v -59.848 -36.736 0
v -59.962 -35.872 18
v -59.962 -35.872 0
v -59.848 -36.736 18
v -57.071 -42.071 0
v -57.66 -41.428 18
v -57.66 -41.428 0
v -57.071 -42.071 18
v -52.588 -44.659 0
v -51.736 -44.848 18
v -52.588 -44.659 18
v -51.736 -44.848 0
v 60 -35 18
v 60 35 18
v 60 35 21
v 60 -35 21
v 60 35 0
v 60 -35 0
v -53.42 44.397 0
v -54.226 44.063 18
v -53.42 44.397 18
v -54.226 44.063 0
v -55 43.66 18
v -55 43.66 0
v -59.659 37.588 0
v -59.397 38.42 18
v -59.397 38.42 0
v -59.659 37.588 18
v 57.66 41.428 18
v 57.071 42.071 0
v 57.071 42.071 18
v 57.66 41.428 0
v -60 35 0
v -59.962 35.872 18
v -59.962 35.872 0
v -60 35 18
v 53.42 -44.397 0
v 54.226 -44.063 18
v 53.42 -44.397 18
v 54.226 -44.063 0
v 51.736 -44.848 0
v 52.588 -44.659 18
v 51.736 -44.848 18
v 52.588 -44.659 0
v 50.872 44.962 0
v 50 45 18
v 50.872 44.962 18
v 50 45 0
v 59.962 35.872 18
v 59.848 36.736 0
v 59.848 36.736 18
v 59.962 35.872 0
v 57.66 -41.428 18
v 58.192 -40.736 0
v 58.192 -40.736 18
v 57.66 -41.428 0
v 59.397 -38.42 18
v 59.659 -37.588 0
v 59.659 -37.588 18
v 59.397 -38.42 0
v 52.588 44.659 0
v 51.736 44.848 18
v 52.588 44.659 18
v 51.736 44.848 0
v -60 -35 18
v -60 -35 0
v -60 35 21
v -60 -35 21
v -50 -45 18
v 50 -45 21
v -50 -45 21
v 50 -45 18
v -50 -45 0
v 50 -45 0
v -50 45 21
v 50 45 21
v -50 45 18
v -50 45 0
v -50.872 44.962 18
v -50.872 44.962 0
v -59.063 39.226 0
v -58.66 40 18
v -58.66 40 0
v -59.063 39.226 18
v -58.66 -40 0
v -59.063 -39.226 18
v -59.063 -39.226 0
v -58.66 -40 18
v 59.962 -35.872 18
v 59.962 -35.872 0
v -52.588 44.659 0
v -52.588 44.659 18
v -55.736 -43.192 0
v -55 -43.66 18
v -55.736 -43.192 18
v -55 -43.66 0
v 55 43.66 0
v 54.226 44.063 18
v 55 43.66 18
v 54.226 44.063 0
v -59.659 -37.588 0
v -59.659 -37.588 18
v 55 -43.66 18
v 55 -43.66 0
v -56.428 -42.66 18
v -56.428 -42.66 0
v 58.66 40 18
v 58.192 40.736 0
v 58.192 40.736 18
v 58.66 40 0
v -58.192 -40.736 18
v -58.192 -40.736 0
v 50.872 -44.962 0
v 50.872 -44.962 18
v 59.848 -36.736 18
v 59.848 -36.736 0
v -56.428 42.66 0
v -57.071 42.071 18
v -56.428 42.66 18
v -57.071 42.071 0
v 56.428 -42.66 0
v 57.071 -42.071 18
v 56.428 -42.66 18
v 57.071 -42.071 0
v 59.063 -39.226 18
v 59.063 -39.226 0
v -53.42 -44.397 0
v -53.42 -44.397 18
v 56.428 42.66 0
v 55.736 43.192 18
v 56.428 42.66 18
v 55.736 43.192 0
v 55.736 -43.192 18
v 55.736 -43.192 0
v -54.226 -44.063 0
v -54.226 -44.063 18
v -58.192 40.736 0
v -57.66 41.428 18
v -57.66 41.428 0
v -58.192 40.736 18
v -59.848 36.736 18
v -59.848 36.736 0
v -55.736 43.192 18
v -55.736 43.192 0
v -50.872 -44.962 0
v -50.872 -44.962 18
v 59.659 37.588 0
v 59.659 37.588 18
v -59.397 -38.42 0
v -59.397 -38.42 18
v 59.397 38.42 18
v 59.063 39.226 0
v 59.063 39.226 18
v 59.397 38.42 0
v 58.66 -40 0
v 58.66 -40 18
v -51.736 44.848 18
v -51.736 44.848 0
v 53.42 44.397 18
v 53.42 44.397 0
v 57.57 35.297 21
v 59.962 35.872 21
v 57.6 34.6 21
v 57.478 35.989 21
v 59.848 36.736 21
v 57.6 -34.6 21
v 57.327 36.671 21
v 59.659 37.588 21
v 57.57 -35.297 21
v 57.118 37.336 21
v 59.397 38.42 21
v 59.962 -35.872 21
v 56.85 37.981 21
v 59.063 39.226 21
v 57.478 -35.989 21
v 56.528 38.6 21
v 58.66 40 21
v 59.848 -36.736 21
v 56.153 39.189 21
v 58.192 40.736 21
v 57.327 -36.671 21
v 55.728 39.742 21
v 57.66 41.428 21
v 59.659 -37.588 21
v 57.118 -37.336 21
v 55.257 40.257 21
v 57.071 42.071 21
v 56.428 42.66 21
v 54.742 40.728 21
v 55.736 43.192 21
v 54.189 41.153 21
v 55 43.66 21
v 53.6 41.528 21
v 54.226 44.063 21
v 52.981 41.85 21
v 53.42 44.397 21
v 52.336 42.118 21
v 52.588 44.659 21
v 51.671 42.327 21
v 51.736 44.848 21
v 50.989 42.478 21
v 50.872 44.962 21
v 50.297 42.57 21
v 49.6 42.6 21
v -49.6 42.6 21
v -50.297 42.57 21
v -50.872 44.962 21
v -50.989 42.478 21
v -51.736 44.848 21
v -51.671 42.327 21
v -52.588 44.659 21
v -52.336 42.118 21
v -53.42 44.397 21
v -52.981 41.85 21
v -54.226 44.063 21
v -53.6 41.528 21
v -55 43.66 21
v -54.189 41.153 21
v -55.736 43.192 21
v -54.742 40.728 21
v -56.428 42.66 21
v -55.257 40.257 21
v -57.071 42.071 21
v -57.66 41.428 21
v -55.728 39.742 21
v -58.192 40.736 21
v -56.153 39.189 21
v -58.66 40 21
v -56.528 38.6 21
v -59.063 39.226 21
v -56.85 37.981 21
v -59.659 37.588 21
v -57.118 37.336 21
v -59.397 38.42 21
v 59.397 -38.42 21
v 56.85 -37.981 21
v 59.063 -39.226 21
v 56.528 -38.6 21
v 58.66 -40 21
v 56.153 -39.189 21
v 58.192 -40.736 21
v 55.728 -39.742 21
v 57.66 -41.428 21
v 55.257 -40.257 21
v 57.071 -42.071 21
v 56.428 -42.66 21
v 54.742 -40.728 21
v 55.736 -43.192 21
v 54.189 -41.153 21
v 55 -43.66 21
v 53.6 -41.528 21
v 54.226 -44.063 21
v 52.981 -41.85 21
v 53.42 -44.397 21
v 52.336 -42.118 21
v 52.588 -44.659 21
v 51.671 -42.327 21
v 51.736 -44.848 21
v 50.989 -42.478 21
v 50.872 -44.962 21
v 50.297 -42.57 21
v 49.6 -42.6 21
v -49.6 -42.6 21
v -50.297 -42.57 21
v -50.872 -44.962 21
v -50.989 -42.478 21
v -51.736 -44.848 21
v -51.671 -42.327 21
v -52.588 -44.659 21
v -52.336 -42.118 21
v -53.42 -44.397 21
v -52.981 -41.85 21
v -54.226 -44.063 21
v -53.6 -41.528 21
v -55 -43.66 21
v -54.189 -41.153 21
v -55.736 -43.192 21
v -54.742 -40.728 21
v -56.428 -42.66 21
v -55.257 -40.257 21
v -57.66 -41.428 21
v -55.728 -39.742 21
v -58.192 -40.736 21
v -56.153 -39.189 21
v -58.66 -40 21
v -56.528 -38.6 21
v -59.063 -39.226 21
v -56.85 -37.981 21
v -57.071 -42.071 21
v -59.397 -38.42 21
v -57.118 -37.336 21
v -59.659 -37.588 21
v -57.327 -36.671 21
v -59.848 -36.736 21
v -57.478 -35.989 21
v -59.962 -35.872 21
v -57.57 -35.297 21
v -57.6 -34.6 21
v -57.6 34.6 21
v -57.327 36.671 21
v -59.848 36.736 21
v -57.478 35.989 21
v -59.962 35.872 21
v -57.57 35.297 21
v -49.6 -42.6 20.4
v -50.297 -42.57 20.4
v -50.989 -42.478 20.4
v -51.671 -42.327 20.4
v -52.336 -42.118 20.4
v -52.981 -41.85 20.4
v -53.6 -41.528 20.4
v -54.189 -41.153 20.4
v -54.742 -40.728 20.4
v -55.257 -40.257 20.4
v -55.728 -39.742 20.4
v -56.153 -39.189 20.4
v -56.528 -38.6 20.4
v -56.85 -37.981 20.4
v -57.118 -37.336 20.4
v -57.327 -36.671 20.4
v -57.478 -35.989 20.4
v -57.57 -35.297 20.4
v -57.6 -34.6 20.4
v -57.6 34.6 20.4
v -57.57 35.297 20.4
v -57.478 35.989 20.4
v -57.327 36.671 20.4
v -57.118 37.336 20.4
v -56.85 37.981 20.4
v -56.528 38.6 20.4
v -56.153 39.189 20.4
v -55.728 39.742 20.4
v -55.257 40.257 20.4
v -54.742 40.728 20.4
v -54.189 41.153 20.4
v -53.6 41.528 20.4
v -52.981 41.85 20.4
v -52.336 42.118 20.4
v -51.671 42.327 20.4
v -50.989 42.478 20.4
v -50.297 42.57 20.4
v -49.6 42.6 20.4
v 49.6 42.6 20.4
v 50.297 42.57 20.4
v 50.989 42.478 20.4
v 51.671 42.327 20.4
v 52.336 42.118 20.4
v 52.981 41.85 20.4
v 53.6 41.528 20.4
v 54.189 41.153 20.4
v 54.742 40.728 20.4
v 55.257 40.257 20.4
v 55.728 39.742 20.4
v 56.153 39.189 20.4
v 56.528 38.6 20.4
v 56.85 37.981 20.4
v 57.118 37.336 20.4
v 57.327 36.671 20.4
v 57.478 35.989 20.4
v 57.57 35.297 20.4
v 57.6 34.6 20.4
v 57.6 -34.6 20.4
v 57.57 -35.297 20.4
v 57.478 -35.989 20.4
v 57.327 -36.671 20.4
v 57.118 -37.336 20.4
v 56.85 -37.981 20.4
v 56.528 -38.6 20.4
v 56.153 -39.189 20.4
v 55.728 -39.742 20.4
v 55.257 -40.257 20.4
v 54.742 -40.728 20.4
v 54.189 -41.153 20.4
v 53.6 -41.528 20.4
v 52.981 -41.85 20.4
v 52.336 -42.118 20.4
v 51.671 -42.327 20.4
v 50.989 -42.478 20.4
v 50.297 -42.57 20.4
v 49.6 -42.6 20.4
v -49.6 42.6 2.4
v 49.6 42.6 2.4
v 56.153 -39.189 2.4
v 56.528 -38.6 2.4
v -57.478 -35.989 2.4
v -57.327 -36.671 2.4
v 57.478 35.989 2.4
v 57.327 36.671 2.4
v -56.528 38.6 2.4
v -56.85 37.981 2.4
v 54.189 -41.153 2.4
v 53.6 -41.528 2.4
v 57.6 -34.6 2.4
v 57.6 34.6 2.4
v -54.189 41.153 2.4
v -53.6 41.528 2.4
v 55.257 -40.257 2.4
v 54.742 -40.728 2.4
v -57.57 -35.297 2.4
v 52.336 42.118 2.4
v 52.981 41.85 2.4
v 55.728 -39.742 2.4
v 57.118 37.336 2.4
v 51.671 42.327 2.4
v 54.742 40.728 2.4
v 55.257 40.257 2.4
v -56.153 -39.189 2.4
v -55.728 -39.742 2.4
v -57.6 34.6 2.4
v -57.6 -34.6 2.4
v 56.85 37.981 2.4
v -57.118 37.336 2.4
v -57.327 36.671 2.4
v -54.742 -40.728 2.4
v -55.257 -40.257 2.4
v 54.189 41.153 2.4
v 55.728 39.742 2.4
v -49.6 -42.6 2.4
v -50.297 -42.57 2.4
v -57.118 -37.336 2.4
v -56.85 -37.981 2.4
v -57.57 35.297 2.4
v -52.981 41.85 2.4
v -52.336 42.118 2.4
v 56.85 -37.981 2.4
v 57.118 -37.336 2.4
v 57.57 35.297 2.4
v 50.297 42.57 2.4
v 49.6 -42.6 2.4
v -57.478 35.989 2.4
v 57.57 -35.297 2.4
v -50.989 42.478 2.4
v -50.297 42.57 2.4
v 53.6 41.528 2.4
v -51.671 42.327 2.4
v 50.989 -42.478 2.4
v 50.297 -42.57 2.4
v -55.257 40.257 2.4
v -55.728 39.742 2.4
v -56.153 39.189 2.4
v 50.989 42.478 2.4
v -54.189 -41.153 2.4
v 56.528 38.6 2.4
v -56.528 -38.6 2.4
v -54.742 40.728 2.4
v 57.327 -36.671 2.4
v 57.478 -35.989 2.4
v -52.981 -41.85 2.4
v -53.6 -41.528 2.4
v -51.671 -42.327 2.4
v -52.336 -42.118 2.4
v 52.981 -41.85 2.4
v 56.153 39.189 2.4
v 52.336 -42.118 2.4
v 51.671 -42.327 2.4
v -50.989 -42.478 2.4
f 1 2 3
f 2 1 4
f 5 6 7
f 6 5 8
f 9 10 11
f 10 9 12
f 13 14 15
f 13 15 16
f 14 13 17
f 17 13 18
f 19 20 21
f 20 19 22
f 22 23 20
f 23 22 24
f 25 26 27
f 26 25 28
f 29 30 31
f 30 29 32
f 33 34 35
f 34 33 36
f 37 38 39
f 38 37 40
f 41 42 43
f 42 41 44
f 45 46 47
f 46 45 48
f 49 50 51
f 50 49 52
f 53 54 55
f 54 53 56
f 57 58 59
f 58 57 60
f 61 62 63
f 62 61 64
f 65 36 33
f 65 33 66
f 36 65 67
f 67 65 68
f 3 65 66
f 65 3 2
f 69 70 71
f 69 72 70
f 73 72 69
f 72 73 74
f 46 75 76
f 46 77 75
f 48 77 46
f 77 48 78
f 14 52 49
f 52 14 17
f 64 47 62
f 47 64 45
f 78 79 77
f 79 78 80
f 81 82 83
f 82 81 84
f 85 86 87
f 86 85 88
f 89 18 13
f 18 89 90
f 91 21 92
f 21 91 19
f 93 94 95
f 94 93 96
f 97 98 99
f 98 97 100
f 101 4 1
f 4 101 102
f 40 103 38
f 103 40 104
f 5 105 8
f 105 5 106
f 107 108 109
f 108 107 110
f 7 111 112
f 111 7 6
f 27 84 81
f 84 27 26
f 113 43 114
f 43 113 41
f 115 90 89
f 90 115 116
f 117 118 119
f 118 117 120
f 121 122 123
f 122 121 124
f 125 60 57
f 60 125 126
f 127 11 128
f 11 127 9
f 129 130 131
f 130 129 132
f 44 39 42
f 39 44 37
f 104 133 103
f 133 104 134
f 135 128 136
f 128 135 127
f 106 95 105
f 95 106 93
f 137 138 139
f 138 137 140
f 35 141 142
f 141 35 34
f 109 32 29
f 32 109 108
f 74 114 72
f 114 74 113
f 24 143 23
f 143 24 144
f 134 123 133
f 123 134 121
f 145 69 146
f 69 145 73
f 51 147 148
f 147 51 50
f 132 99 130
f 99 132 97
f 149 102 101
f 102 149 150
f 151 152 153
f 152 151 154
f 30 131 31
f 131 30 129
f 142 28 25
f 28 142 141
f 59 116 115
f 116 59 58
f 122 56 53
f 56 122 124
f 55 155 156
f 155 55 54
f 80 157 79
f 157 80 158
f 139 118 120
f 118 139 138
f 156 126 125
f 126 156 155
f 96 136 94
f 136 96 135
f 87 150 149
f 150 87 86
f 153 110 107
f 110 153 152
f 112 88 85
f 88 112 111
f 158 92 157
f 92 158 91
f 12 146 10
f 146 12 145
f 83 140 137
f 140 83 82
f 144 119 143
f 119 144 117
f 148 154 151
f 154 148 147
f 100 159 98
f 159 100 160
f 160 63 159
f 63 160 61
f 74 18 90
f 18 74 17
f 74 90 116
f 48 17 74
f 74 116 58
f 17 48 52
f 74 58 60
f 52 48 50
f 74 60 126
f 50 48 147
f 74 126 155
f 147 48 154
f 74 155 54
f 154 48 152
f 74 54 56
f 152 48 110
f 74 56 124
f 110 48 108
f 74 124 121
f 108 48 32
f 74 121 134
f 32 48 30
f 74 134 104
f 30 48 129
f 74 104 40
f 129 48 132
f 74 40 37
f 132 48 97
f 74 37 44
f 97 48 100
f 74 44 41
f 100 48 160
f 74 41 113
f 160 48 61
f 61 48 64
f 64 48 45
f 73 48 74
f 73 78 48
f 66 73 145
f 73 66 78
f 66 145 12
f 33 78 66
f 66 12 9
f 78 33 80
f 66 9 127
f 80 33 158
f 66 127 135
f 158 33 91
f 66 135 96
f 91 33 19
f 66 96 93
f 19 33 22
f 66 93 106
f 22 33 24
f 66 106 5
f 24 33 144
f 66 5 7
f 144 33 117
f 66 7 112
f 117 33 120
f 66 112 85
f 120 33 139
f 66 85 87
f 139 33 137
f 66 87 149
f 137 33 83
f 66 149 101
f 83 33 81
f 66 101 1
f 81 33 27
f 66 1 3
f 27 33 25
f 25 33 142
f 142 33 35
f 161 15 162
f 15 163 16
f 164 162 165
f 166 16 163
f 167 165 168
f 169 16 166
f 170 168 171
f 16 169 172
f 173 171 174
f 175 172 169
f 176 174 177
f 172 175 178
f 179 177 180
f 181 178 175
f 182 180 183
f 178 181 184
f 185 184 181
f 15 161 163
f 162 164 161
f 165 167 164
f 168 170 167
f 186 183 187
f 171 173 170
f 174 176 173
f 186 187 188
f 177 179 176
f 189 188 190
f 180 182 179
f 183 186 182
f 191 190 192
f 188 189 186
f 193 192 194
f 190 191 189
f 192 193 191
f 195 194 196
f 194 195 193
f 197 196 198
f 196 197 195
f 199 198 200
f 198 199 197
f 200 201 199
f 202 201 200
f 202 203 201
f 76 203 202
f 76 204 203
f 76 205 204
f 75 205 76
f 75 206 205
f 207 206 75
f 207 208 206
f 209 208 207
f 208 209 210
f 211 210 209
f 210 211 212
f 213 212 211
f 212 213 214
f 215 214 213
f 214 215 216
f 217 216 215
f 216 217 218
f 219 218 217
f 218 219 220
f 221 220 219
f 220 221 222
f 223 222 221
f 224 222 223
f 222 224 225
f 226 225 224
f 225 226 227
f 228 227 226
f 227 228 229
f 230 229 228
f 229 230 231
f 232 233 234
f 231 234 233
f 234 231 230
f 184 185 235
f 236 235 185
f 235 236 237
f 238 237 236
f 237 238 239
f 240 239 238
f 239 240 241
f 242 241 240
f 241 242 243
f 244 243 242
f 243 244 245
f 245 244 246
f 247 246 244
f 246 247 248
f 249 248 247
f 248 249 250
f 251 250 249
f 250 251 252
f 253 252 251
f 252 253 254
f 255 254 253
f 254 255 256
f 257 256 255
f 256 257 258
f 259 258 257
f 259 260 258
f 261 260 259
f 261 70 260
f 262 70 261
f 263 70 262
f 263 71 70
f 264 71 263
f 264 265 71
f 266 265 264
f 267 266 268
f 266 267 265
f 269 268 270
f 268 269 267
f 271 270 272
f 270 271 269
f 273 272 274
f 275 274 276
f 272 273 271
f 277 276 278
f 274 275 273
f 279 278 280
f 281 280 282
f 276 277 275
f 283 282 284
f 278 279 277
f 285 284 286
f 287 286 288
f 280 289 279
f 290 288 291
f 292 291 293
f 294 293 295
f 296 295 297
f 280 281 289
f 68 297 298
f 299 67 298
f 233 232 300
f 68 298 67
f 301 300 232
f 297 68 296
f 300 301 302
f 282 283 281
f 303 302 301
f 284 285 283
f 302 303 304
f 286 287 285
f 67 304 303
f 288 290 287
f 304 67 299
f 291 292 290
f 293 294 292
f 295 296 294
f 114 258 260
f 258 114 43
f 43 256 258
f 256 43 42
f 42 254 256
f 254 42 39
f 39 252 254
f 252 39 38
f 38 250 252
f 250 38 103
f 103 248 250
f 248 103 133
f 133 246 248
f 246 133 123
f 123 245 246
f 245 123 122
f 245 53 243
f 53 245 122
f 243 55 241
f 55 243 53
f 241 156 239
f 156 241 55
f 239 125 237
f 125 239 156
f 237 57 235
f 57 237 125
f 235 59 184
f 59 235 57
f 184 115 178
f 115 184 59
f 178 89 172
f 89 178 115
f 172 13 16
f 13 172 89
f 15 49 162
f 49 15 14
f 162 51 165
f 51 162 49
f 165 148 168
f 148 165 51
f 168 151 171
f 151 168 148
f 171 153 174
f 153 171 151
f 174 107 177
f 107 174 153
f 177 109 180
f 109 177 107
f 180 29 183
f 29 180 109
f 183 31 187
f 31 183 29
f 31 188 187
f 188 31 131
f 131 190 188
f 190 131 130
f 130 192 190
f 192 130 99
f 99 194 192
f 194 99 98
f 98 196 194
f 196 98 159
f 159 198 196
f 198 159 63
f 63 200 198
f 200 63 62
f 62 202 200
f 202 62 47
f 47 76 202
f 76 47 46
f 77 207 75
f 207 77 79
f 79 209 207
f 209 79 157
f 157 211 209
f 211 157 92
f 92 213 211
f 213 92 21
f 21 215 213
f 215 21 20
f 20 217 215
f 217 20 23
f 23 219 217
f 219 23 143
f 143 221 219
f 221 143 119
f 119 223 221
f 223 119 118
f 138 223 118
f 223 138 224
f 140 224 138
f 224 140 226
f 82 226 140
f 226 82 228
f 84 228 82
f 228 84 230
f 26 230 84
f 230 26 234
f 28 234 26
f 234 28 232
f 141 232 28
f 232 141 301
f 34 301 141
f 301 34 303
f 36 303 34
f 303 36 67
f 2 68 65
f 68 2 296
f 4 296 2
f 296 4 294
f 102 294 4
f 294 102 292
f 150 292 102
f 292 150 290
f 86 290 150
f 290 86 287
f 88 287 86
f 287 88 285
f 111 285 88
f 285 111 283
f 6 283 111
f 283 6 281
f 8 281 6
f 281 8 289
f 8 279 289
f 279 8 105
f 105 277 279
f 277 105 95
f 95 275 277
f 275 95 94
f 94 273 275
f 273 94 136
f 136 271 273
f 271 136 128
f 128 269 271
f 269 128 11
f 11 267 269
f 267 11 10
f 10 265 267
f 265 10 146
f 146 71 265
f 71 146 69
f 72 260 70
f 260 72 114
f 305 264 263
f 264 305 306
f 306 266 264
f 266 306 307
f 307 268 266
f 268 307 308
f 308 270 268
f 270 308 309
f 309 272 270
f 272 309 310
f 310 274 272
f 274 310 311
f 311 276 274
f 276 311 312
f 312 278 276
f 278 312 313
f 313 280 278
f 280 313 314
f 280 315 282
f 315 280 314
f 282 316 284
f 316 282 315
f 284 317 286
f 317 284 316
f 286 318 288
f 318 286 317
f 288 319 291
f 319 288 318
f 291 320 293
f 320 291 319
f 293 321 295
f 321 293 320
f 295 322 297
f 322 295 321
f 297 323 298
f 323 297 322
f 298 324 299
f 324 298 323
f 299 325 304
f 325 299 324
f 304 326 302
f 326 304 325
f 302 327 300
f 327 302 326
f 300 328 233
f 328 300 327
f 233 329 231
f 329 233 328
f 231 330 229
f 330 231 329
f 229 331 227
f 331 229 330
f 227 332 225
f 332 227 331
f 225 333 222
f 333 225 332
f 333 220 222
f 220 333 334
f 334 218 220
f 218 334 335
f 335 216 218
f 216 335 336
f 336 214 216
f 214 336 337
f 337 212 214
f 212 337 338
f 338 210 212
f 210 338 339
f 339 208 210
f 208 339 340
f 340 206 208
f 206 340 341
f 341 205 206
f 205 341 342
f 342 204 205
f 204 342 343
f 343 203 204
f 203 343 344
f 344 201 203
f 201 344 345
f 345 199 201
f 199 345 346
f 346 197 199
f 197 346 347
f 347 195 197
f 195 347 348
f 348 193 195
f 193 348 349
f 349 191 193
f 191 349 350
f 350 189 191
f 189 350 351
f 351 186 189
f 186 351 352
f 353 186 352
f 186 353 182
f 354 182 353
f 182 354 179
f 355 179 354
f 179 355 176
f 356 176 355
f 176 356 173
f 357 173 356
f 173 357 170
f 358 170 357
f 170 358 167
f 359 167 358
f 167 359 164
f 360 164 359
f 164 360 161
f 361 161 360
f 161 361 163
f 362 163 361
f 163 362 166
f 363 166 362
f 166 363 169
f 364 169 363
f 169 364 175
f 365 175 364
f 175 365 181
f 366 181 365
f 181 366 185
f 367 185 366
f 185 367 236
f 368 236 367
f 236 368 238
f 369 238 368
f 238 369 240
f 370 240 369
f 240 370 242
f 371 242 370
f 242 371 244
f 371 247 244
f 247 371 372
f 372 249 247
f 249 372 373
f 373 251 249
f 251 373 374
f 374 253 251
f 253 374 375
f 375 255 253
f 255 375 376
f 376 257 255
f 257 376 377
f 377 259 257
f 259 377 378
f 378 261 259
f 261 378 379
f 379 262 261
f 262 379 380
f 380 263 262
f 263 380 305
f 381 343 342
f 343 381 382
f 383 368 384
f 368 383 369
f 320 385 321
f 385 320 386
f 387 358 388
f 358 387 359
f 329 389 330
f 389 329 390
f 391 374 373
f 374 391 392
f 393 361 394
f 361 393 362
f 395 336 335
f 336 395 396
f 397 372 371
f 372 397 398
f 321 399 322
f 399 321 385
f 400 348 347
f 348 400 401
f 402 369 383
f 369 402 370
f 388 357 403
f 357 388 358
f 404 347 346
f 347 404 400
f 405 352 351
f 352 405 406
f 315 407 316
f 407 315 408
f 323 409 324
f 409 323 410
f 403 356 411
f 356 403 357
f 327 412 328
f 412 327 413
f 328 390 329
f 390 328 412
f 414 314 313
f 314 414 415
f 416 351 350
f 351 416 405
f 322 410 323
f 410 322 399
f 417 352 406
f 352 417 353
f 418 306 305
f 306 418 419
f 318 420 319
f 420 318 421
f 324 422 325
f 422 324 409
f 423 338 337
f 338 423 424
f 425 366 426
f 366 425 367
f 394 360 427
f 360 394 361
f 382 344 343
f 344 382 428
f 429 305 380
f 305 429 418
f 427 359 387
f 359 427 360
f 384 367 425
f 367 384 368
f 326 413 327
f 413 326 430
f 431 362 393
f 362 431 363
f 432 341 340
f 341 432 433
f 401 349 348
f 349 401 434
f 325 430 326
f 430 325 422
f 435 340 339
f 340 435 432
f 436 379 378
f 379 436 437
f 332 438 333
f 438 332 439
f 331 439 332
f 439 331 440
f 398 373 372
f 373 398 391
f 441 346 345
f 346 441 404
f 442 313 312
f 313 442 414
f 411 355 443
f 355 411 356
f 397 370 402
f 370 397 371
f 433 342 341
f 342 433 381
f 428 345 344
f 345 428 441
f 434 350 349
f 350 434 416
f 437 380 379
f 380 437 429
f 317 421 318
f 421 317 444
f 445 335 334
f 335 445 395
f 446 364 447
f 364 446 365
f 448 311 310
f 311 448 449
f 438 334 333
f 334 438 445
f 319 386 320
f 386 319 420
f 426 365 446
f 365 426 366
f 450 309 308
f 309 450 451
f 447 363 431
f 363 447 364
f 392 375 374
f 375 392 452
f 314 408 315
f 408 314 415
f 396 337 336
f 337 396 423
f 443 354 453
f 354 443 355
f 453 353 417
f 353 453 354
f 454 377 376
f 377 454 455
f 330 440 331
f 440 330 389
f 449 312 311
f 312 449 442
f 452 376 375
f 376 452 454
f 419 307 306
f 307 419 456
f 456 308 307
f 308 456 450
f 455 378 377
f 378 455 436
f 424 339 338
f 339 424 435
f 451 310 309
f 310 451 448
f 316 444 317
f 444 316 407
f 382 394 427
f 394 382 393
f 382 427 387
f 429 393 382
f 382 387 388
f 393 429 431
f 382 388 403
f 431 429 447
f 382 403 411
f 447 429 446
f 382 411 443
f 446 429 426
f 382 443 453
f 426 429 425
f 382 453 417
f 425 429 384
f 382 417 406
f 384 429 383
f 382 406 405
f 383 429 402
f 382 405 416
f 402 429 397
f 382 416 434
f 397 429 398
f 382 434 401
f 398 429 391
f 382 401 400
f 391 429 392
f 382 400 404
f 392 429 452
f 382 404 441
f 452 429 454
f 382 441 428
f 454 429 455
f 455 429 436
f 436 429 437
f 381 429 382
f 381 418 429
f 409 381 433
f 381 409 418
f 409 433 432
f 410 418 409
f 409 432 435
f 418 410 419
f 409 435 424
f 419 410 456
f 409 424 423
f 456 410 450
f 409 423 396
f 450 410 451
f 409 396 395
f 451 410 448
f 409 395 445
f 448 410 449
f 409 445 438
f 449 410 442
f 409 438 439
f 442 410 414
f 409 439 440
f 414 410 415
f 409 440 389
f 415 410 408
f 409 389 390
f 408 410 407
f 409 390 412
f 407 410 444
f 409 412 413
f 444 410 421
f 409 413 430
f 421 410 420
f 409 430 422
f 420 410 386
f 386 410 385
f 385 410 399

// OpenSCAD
// TS-PET-B05 - Stackable Accessory Valet Tray
$fn = 72; tray_w = 120; tray_h = 90; tray_d = 18; wall = 2.4; corner_r = 10; stack_lip_h = 3.0;
module rounded_rect_2d(w,h,r) { hull() { translate([-w/2 + r, -h/2 + r]) circle(r = r); translate([ w/2 - r, -h/2 + r]) circle(r = r); translate([-w/2 + r,  h/2 - r]) circle(r = r); translate([ w/2 - r,  h/2 - r]) circle(r = r);} }
difference() {
    union() { linear_extrude(height = tray_d) rounded_rect_2d(tray_w, tray_h, corner_r); translate([0,0,tray_d]) linear_extrude(height = stack_lip_h) difference() { rounded_rect_2d(tray_w, tray_h, corner_r); rounded_rect_2d(tray_w - 2*wall, tray_h - 2*wall, corner_r - 2); } }
    translate([0,0,wall]) linear_extrude(height = tray_d) rounded_rect_2d(tray_w - 2*wall, tray_h - 2*wall, corner_r - 2);
}
